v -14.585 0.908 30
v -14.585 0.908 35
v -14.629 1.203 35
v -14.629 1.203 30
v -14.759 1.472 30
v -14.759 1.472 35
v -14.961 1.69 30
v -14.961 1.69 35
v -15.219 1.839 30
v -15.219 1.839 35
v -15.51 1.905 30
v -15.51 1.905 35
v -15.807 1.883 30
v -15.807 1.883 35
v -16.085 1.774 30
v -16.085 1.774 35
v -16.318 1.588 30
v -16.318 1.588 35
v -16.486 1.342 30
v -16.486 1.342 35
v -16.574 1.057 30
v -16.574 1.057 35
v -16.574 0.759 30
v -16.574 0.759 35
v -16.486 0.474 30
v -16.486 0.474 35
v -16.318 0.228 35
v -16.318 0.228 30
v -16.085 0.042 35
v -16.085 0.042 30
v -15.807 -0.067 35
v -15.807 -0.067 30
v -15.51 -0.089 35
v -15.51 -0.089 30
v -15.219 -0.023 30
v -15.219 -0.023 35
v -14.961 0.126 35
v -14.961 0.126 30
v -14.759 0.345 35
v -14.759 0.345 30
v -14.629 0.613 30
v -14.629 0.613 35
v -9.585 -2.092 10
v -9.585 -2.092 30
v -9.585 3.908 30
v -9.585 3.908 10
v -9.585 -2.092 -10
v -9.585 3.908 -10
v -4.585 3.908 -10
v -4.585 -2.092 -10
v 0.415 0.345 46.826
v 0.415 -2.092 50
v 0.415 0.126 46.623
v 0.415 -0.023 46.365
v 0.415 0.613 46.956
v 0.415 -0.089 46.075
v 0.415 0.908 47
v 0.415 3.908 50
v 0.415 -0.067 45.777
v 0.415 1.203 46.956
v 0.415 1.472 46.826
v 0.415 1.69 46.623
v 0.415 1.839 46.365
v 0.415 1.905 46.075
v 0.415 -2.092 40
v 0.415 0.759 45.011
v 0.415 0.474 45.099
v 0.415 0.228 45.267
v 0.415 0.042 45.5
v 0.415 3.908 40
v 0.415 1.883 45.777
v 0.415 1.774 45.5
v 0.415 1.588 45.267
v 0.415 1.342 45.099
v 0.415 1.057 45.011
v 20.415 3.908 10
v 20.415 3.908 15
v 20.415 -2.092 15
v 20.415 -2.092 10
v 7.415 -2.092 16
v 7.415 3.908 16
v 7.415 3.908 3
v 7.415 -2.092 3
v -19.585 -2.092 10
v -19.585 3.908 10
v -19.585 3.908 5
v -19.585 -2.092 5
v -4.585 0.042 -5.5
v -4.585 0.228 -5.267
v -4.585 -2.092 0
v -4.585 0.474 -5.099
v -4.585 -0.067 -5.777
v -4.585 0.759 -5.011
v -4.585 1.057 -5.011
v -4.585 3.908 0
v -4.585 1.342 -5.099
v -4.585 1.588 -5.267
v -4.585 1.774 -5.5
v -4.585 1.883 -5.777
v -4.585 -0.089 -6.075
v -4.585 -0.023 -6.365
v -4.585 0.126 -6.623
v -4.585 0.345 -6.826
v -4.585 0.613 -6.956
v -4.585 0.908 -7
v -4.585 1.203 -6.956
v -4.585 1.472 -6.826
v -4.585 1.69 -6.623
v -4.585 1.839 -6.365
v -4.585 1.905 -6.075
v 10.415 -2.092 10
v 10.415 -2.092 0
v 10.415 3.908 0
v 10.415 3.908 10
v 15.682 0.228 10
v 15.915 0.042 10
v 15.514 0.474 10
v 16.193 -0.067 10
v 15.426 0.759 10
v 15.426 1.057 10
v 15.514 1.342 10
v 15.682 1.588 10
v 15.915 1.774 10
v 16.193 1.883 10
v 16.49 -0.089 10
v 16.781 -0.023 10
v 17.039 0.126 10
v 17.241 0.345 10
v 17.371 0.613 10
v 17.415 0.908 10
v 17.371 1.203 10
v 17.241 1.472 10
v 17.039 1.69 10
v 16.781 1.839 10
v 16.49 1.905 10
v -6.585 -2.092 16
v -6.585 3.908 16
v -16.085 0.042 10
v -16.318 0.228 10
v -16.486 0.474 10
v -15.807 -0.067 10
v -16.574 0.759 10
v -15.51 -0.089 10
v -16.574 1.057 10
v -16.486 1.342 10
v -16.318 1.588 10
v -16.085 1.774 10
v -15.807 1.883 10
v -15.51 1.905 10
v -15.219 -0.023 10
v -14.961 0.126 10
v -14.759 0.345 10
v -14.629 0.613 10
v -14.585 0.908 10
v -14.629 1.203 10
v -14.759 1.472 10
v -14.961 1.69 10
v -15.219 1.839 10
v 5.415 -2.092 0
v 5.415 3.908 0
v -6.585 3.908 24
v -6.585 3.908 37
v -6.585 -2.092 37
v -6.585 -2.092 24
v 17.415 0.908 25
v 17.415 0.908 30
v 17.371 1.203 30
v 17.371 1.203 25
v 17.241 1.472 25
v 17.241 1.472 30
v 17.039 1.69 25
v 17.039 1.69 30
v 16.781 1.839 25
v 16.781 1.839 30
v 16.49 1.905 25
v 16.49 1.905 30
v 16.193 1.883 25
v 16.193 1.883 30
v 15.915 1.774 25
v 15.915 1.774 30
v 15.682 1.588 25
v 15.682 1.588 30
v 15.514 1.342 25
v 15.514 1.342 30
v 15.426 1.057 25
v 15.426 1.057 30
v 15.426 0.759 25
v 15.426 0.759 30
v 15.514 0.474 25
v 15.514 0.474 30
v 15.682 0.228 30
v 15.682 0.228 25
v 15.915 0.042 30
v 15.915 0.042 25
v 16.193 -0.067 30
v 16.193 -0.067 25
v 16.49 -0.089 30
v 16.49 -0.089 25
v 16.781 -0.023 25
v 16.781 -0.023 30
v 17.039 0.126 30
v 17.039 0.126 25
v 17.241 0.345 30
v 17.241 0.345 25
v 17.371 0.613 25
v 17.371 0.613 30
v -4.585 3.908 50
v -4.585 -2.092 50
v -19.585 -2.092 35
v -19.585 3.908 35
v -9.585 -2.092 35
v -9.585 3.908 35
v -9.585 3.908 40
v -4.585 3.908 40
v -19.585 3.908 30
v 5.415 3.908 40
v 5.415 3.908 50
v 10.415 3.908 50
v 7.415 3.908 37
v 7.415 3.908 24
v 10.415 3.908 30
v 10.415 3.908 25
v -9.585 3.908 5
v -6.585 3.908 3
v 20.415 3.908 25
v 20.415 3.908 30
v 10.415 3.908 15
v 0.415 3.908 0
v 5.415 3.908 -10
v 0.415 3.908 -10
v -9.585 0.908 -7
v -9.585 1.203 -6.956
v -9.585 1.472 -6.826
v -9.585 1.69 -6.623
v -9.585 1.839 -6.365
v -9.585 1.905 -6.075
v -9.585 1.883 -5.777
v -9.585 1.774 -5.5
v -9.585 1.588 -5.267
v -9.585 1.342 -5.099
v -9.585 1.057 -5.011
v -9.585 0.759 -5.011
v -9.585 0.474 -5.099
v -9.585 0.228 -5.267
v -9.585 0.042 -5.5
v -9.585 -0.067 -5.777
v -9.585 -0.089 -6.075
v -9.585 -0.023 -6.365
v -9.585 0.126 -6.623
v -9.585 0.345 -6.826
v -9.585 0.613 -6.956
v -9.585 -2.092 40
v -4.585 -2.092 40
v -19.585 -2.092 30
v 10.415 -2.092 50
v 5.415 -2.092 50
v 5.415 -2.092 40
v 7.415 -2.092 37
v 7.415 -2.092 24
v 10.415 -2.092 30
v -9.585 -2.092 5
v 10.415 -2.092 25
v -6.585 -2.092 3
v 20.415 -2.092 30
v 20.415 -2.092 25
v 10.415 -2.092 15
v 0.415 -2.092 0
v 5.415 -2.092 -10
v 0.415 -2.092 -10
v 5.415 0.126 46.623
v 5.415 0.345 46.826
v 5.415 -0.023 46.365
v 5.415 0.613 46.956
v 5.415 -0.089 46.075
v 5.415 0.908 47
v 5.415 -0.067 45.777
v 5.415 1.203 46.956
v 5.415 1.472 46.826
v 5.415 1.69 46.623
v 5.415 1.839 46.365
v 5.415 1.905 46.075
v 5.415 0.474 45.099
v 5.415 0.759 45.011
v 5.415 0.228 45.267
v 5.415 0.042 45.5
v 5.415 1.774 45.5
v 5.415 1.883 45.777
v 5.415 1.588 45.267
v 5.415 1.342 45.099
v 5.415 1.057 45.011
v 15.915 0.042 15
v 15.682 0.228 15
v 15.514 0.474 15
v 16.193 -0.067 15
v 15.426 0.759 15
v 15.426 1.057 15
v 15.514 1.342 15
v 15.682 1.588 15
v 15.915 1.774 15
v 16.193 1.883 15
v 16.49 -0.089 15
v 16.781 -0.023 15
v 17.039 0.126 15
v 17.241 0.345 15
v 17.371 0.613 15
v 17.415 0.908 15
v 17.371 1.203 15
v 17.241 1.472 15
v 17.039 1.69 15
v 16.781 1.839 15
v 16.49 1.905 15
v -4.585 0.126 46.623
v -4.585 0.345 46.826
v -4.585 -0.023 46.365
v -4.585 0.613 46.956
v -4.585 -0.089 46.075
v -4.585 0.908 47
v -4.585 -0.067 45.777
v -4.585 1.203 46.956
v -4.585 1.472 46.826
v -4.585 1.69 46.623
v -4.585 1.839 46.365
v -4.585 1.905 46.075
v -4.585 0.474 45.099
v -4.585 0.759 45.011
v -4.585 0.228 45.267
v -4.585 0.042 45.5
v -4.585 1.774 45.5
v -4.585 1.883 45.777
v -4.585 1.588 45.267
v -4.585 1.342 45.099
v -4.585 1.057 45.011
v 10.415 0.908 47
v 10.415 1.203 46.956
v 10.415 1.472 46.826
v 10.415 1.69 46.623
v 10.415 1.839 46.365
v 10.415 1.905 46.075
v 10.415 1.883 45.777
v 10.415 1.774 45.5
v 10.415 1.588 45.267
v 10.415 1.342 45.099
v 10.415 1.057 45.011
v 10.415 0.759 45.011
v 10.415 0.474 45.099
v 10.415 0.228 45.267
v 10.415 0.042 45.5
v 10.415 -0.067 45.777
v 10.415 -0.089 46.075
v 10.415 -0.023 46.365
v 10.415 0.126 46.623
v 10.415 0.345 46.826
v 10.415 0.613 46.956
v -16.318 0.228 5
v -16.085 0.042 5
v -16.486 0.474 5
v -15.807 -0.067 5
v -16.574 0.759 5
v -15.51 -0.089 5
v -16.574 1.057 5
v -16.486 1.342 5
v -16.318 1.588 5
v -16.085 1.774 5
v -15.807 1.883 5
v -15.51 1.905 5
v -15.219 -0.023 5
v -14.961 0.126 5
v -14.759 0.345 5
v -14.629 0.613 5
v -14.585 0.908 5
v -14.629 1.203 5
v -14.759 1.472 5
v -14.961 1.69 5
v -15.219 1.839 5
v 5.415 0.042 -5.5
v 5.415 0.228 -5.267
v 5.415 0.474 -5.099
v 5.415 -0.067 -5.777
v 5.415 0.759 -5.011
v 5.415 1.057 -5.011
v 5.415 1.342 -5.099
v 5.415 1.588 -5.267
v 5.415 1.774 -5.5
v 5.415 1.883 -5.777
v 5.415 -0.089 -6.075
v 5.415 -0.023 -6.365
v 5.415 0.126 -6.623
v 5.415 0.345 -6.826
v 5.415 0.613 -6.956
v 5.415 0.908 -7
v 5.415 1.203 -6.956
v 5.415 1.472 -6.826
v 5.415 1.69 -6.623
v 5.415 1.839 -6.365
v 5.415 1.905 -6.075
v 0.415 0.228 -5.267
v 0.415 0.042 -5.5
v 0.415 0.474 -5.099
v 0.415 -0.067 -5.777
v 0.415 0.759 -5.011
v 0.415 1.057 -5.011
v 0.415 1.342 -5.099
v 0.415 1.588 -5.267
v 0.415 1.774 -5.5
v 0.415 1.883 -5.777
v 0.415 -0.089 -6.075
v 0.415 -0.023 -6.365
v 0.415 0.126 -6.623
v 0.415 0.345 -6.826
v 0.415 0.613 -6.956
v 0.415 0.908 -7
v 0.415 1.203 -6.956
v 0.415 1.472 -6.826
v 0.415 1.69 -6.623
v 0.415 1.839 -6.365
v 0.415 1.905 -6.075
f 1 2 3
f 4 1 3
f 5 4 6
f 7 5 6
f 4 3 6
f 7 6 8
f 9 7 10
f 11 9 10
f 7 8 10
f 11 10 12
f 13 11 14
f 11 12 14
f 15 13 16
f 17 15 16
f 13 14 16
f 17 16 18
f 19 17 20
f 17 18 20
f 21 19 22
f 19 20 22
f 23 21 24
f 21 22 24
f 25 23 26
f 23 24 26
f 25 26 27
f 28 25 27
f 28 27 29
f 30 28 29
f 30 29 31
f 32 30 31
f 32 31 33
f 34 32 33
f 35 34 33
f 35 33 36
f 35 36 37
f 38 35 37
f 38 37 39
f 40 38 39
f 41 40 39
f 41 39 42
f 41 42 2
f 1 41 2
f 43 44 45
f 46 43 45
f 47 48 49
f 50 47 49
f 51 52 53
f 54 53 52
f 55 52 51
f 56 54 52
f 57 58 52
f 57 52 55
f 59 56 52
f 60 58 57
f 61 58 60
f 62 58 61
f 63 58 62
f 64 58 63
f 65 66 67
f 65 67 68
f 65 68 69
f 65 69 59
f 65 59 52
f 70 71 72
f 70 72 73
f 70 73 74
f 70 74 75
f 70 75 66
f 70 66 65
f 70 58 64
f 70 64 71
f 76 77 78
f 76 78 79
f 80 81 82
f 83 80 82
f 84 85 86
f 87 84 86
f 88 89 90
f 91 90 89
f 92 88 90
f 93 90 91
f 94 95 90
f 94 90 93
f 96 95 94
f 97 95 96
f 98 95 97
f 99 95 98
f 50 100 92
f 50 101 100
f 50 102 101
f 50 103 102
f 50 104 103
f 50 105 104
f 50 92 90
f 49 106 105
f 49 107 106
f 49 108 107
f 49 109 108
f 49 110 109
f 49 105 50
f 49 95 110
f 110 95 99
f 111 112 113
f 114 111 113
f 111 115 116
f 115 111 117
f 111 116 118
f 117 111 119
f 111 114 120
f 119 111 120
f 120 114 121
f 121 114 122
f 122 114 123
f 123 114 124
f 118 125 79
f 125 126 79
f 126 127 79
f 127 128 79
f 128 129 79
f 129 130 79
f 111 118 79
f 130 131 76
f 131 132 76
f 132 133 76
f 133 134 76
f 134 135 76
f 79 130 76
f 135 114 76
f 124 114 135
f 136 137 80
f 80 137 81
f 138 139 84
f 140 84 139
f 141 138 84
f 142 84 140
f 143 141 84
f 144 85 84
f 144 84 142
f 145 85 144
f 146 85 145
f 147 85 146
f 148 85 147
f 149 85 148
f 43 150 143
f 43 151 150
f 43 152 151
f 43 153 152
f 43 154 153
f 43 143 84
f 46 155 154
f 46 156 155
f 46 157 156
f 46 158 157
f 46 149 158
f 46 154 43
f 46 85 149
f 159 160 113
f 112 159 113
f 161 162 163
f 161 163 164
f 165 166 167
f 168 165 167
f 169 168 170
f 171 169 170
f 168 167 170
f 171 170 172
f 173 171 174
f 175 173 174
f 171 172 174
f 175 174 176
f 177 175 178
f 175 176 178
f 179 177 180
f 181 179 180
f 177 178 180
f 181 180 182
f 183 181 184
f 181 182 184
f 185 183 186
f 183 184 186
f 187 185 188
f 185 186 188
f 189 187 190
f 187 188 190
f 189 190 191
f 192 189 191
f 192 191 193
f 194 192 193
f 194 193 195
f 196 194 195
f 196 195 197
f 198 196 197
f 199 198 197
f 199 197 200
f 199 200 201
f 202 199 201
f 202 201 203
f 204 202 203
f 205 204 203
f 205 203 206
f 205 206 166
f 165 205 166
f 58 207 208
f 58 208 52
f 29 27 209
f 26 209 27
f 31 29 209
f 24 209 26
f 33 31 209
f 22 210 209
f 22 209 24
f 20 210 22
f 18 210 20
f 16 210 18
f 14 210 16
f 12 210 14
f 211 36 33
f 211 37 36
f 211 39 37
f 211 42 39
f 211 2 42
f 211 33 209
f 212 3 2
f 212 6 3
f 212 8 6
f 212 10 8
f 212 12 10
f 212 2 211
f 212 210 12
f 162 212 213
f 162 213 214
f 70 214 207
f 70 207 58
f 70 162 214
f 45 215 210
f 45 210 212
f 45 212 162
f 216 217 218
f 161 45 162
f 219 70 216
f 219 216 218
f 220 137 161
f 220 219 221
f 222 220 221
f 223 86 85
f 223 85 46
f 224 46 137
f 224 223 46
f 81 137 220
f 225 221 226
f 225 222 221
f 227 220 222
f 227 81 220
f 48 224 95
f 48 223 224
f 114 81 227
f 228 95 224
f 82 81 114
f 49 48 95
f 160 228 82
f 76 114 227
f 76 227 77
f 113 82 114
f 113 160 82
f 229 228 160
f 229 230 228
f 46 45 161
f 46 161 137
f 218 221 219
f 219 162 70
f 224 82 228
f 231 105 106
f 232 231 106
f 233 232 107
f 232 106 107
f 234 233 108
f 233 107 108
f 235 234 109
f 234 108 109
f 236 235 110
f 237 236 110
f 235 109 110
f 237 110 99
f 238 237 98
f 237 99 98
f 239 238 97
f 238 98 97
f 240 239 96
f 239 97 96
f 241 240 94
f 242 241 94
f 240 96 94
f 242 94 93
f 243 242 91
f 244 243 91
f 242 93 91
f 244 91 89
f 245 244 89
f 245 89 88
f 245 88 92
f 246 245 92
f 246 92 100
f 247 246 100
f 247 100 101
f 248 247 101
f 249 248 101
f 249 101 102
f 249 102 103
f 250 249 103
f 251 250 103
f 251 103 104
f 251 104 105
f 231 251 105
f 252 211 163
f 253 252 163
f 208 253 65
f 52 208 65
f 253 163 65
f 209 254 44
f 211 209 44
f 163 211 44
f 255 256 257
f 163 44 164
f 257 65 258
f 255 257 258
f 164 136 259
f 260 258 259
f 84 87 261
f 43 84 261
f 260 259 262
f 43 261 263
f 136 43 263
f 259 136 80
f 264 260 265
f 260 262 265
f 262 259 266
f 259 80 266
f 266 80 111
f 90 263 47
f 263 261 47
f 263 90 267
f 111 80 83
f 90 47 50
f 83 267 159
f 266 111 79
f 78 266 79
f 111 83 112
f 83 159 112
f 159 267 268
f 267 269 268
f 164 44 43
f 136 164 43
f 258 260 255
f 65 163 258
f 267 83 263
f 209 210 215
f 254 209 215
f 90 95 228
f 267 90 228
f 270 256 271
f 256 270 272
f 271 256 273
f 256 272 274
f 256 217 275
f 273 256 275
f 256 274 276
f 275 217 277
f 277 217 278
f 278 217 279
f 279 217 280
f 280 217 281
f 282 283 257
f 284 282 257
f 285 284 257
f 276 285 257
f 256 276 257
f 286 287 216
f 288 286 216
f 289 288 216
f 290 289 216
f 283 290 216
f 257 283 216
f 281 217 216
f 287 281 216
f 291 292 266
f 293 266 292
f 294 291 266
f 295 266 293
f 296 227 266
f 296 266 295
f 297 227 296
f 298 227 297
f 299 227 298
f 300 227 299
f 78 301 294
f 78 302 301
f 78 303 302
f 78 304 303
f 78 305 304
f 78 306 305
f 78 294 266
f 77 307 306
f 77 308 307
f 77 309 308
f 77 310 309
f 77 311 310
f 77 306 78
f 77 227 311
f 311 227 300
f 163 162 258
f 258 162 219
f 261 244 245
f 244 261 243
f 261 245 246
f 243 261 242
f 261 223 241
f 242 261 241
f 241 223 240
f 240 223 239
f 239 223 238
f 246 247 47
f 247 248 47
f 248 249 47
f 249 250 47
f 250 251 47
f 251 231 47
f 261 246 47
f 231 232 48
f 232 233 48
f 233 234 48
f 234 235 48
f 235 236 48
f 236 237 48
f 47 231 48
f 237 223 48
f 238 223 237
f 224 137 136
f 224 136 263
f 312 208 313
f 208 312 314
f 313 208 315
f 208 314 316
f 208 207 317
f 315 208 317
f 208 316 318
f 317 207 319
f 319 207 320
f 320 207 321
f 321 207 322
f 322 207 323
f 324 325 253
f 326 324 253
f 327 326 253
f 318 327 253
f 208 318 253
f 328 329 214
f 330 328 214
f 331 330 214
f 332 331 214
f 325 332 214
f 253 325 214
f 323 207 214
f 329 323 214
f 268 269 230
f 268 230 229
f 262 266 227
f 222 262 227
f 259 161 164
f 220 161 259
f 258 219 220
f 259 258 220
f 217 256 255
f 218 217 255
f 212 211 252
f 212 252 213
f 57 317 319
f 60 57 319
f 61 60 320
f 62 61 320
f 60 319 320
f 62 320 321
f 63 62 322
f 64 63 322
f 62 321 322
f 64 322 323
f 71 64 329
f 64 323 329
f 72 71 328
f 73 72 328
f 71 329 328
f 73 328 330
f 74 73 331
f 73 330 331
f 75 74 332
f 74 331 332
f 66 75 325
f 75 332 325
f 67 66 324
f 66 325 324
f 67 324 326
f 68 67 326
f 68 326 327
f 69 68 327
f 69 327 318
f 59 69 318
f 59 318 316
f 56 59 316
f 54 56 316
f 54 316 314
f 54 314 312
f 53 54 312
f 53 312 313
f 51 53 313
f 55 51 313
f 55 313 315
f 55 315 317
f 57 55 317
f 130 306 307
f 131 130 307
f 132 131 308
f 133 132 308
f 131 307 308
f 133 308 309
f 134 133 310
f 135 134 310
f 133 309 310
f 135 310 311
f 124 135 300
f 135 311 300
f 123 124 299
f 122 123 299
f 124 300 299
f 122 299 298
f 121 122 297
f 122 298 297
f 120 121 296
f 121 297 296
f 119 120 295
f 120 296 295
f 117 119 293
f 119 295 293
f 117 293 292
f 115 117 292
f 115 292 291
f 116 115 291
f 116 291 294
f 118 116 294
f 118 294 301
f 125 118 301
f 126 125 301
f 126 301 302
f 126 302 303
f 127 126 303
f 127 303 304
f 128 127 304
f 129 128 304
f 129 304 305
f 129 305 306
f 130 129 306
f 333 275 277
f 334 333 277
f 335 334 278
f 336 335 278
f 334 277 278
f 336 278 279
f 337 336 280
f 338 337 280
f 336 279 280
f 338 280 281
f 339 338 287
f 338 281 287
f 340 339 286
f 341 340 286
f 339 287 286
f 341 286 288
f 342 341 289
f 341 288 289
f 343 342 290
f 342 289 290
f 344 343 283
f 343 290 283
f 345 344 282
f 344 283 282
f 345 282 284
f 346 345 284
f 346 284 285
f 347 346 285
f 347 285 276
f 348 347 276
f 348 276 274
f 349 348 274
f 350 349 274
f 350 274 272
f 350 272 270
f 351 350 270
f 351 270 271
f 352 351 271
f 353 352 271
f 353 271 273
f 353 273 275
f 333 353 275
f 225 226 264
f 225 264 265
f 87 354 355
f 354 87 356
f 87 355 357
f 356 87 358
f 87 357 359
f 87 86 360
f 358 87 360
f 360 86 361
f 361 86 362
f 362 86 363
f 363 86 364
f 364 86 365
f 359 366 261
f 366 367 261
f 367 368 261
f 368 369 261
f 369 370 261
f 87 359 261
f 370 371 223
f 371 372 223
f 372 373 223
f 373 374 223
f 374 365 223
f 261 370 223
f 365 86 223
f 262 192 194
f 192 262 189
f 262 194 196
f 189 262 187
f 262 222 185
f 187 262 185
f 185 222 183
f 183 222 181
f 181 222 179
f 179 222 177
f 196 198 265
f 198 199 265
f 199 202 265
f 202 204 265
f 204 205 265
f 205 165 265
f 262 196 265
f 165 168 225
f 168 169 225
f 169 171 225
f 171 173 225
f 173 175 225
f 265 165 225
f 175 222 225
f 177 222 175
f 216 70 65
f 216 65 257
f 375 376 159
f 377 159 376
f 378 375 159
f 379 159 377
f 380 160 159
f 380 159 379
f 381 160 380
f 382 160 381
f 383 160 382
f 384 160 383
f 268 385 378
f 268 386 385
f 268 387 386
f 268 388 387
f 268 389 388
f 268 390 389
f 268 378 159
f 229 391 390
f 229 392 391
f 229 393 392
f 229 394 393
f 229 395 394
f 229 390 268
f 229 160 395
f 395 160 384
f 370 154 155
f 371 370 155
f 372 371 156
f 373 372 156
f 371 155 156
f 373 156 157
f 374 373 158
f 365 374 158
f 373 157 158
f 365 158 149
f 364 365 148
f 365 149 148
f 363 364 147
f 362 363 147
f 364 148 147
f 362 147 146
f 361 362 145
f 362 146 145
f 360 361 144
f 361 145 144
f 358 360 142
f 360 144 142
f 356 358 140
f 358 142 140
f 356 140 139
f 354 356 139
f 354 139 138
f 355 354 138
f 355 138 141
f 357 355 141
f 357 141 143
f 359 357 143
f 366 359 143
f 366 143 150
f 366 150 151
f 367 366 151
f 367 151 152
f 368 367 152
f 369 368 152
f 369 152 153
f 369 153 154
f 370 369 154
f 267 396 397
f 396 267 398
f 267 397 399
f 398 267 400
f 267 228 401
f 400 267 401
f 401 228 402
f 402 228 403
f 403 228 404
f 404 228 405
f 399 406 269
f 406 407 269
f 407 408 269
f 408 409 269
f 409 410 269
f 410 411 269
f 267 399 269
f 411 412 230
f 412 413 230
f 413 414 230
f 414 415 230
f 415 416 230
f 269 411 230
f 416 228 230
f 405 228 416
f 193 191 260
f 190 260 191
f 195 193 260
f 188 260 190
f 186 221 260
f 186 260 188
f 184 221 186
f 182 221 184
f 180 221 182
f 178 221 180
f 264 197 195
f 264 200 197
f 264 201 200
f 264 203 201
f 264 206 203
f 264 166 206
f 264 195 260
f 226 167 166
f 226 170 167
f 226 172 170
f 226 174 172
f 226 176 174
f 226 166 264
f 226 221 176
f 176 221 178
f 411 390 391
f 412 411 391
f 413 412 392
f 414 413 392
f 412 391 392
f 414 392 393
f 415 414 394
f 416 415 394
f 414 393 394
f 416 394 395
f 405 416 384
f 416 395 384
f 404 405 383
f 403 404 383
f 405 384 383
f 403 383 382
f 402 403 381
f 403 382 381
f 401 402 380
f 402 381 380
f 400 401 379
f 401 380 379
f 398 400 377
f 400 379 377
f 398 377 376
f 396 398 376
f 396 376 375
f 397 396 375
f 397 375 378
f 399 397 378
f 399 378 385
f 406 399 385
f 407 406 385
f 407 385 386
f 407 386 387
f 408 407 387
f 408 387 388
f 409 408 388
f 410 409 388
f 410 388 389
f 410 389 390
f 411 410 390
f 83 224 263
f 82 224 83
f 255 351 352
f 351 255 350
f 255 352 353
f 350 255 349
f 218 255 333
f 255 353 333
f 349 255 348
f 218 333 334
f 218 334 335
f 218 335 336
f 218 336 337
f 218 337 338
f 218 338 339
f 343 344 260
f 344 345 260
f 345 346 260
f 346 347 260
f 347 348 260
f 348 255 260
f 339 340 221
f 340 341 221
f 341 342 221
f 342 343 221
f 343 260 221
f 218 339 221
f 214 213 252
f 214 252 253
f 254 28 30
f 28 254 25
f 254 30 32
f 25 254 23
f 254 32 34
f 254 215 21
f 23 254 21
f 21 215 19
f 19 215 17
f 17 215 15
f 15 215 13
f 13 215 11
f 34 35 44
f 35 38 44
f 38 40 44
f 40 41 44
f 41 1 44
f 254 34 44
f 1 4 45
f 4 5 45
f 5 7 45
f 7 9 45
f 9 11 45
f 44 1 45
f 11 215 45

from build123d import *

# Parameters (mm, degrees)
ESBO_O1_W                = 20
ESBO_O1_H                = 6
RESSALTO_EXTRUS_O1_DEPTH = 40
ESBO_O2_W                = 10
ESBO_O2_H                = 5
ESBO_O2_W_2              = 5
ESBO_O2_H_2              = 10
RESSALTO_EXTRUS_O2_DEPTH = 6
ESBO_O3_R                = 1
CORTE_EXTRUS_O1_DEPTH    = 40
ESBO_O4_R                = 1
CORTE_EXTRUS_O2_DEPTH    = 40
ESBO_O5_R                = 1
CORTE_EXTRUS_O3_DEPTH    = 40
ESBO_O6_R                = 1
CORTE_EXTRUS_O4_DEPTH    = 40
ESBO_O7_W                = 14
ESBO_O7_H                = 13
CORTE_EXTRUS_O5_DEPTH    = 40


with BuildPart() as part:
    # Esboço1 → Ressalto-extrusão1 (new body)
    with BuildSketch(Plane.XY):
        with Locations((0.415187471, 0.908205796)):
            Rectangle(ESBO_O1_W, ESBO_O1_H)
    extrude(amount=RESSALTO_EXTRUS_O1_DEPTH)

    # Esboço2 → Ressalto-extrusão2 (add, through all)
    with BuildSketch(Plane(origin=(0, 3.908205796, 0), x_dir=(1, 0, 0), z_dir=(0, 1, 0))):
        with Locations((-14.584812529, -7.5)):
            Rectangle(ESBO_O2_W, ESBO_O2_H)
        with Locations((-14.584812529, -32.5)):
            Rectangle(ESBO_O2_W, ESBO_O2_H)
        with Locations((-7.084812529, 5)):
            Rectangle(ESBO_O2_W_2, ESBO_O2_H_2)
        with Locations((2.915187471, 5)):
            Rectangle(ESBO_O2_W_2, ESBO_O2_H_2)
        with Locations((15.415187471, -12.5)):
            Rectangle(ESBO_O2_W, ESBO_O2_H)
        with Locations((15.415187471, -27.5)):
            Rectangle(ESBO_O2_W, ESBO_O2_H)
        with Locations((-2.084812529, -45)):
            Rectangle(ESBO_O2_W_2, ESBO_O2_H_2)
        with Locations((7.915187471, -45)):
            Rectangle(ESBO_O2_W_2, ESBO_O2_H_2)
    extrude(amount=-RESSALTO_EXTRUS_O2_DEPTH)

    # Esboço3 → Corte-extrusão1 (cut)
    with BuildSketch(Plane.XY.offset(30)):
        with Locations((16.415187471, 0.908205796)):
            Circle(ESBO_O3_R)
    extrude(amount=-CORTE_EXTRUS_O1_DEPTH, mode=Mode.SUBTRACT)

    # Esboço4 → Corte-extrusão2 (cut)
    with BuildSketch(Plane.ZY.offset(4.584812529)):
        with Locations((46, 0.908205796)):
            Circle(ESBO_O4_R)
    extrude(amount=-CORTE_EXTRUS_O2_DEPTH, mode=Mode.SUBTRACT)

    # Esboço5 → Corte-extrusão3 (cut)
    with BuildSketch(Plane.XY.offset(35)):
        with Locations((-15.584812529, 0.908205796)):
            Circle(ESBO_O5_R)
    extrude(amount=-CORTE_EXTRUS_O3_DEPTH, mode=Mode.SUBTRACT)

    # Esboço6 → Corte-extrusão4 (cut)
    with BuildSketch(Plane(origin=(5.415187471, 0, 0), x_dir=(0, 0, -1), z_dir=(1, 0, 0))):
        with Locations((6, 0.908205796)):
            Circle(ESBO_O6_R)
    extrude(amount=-CORTE_EXTRUS_O4_DEPTH, mode=Mode.SUBTRACT)

    # Esboço7 → Corte-extrusão5 (cut)
    with BuildSketch(Plane(origin=(0, 3.908205796, 0), x_dir=(1, 0, 0), z_dir=(0, 1, 0))):
        with Locations((0.415187471, -9.5)):
            Rectangle(ESBO_O7_W, ESBO_O7_H)
        with Locations((0.415187471, -30.5)):
            Rectangle(ESBO_O7_W, ESBO_O7_H)
    extrude(amount=-CORTE_EXTRUS_O5_DEPTH, mode=Mode.SUBTRACT)


solid = part.part
